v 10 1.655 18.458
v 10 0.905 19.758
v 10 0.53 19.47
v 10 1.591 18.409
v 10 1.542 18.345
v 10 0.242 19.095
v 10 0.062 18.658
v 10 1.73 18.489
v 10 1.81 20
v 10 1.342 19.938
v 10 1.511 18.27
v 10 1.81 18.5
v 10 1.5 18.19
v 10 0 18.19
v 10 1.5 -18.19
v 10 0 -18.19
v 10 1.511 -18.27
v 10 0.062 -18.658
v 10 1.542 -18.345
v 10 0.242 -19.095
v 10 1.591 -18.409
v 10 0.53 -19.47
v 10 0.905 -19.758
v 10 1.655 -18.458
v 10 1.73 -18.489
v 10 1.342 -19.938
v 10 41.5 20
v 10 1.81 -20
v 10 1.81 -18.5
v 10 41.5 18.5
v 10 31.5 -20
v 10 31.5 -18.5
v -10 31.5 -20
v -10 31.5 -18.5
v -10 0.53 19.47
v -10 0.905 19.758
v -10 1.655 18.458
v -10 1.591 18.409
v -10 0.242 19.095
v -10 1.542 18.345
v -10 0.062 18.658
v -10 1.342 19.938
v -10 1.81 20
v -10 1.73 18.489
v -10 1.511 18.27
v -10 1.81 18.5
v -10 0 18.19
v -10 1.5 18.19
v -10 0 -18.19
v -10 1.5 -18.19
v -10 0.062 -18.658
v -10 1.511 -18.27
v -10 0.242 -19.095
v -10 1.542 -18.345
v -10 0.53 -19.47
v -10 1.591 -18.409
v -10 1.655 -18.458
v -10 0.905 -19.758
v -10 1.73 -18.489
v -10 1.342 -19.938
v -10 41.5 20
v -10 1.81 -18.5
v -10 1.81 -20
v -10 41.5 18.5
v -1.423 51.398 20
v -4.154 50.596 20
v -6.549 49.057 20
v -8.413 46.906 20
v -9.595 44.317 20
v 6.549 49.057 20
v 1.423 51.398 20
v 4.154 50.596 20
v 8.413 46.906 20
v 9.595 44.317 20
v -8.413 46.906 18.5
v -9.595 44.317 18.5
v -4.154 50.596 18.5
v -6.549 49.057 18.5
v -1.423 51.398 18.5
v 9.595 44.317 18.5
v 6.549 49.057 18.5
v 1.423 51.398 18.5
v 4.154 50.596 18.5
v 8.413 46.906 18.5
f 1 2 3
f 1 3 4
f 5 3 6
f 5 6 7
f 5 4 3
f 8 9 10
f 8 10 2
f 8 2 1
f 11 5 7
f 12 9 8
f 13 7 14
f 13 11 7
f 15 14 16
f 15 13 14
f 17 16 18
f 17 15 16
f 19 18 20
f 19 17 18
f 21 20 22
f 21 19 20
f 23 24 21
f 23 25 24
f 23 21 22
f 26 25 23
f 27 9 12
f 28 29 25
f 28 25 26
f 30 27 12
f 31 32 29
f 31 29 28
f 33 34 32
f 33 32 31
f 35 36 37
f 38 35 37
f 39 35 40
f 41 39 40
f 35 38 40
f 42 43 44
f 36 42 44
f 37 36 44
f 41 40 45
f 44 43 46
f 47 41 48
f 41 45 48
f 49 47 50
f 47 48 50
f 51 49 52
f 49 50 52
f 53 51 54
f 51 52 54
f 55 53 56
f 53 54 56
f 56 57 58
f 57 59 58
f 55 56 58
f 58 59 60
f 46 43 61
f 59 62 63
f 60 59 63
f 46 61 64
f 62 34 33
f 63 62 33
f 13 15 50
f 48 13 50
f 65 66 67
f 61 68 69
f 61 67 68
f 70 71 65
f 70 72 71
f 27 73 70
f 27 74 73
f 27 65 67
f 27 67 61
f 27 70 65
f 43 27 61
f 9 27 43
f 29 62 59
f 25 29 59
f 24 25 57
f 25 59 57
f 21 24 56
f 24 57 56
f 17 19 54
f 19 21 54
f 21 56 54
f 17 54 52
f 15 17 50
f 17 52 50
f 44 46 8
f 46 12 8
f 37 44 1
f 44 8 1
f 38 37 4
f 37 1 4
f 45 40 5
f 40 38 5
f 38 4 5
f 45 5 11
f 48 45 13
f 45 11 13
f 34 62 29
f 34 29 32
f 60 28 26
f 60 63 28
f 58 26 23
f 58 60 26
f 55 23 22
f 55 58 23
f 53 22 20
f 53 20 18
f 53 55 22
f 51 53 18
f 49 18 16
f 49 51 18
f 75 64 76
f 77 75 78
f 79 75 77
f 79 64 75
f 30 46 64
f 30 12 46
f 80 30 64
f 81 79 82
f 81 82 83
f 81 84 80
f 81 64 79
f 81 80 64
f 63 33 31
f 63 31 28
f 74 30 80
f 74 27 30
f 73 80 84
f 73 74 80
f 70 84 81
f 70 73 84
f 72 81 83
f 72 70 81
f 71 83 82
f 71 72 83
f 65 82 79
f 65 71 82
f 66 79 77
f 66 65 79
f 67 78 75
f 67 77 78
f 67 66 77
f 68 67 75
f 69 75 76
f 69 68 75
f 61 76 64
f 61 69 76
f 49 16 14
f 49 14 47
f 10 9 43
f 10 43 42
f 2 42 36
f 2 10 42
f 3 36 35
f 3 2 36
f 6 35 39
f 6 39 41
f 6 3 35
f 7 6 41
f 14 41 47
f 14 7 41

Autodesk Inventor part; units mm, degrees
ref_plane "YZ Plane" through (0, 0, 0) normal (1, 0, 0) x (0, 1, 0)
ref_plane "XZ Plane" through (0, 0, 0) normal (0, 1, 0) x (-1, 0, 0)
ref_plane "XY Plane" through (0, 0, 0) normal (0, 0, 1) x (1, 0, 0)
sketch "Sketch1" plane through (0, 0, 0) normal (0, 1, 0) x (-1, 0, 0)
  line L0 (10, -18.5) -> (-10, -18.5)
  line L1 (-10, -18.5) -> (-10, 18.5)
  line L2 (-10, 18.5) -> (10, 18.5)
  line L3 (10, 18.5) -> (10, -18.5)
  point P0 (0, 0)
  dimension "d0" = 20
  dimension "d1" = 37
  dimension "d2" = 18.5
  dimension "d3" = 10
extrude "Plate1" add sketch "Sketch1" along normal blind 1.5
sketch "Sketch2" plane through (-10, 0, -20) normal (0, 0, 1) x (1, 0, 0)
  line L0 (20, 0) -> (0, 0)
  line L1 (0, 0) -> (0, 31.5)
  line L2 (0, 31.5) -> (20, 31.5)
  line L3 (20, 31.5) -> (20, 0)
edge flange "Flange1" height 31.5 angle 90 thickness 1.5 bend radius 0.31 thickness toward (0, 0, 1) relief tear relief width 1.5 relief depth 0.75 edges at (0, 1.5, -18.5) wall of the first edge with corners at (10, 0, -20) (-10, 0, -20) (-10, 31.5, -20) (10, 31.5, -20)
bend "Bend1"
corner "Corner1"
sketch "Sketch3" plane through (10, 0, 20) normal (0, 0, -1) x (-1, 0, 0)
  line L0 (20, 0) -> (0, 0)
  line L1 (0, 0) -> (0, 51.5)
  line L2 (0, 51.5) -> (20, 51.5)
  line L3 (20, 51.5) -> (20, 0)
edge flange "Flange2" height 51.5 angle 90 thickness 1.5 bend radius 0.31 thickness toward (0, 0, -1) relief tear relief width 1.5 relief depth 0.75 edges at (0, 1.5, 18.5) wall of the first edge with corners at (-10, 0, 20) (10, 0, 20) (10, 51.5, 20) (-10, 51.5, 20)
bend "Bend2"
corner "Corner2"
sketch "Sketch4" plane through (-10, 51.5, 20) normal (0, 0, 1) x (1, 0, 0)
  circle A0 centre (10, -10) radius 10
  line L0 (0, 0) -> (20, 0) projected
  line L1 (0, 0) -> (20, 0)
  line L2 (20, 0) -> (20, -10)
  line L3 (20, -10) -> (0, -10)
  line L4 (0, -10) -> (0, 0)
  line L5 (0, -49.69) -> (0, 0) projected
  point P0 (10, -51.5)
  point P1 (10, 0)
  dimension "d26" = 20
  dimension "d25" = 10
  dimension "d27" = 10
  dimension "d28" = 10
extrude "Extrusion1" cut sketch "Sketch4" against normal blind 10 contours L4 L0 A0 | A0 L0 L2
equation "\"d4\" = Thickness"
equation "\"d5\" = BendReliefWidth"
equation "\"d6\" = BendReliefDepth"
equation "\"d7\" = MinimumRemnant"
equation "\"d8\" = TransitionRadius"
equation "\"d11\" = BendRadius"
equation "\"d12\" = CornerReliefSize"
equation "\"d13\" = GapSize"
equation "\"d14\" = JacobiRadiusSize"
equation "\"d15\" = BendReliefWidth"
equation "\"d16\" = BendReliefDepth"
equation "\"d17\" = MinimumRemnant"
equation "\"d18\" = TransitionRadius"
equation "\"d21\" = BendRadius"
equation "\"d22\" = CornerReliefSize"
equation "\"d23\" = GapSize"
equation "\"d24\" = JacobiRadiusSize"
equation "\"BendReliefWidth\" = Thickness"
equation "\"BendReliefDepth\" = 0.5 * Thickness"
equation "\"CornerReliefSize\" = 4 * Thickness"
equation "\"MinimumRemnant\" = 2 * Thickness"
equation "\"TransitionRadius\" = BendRadius"
equation "\"JacobiRadiusSize\" = BendRadius"
equation "\"GapSize\" = Thickness"
equation "\"Thickness\" = 1.5"
equation "\"BendRadius\" = 0.31"
properties part number "axis_9_bottom_frame" material "Aluminum 6061-AHC"
